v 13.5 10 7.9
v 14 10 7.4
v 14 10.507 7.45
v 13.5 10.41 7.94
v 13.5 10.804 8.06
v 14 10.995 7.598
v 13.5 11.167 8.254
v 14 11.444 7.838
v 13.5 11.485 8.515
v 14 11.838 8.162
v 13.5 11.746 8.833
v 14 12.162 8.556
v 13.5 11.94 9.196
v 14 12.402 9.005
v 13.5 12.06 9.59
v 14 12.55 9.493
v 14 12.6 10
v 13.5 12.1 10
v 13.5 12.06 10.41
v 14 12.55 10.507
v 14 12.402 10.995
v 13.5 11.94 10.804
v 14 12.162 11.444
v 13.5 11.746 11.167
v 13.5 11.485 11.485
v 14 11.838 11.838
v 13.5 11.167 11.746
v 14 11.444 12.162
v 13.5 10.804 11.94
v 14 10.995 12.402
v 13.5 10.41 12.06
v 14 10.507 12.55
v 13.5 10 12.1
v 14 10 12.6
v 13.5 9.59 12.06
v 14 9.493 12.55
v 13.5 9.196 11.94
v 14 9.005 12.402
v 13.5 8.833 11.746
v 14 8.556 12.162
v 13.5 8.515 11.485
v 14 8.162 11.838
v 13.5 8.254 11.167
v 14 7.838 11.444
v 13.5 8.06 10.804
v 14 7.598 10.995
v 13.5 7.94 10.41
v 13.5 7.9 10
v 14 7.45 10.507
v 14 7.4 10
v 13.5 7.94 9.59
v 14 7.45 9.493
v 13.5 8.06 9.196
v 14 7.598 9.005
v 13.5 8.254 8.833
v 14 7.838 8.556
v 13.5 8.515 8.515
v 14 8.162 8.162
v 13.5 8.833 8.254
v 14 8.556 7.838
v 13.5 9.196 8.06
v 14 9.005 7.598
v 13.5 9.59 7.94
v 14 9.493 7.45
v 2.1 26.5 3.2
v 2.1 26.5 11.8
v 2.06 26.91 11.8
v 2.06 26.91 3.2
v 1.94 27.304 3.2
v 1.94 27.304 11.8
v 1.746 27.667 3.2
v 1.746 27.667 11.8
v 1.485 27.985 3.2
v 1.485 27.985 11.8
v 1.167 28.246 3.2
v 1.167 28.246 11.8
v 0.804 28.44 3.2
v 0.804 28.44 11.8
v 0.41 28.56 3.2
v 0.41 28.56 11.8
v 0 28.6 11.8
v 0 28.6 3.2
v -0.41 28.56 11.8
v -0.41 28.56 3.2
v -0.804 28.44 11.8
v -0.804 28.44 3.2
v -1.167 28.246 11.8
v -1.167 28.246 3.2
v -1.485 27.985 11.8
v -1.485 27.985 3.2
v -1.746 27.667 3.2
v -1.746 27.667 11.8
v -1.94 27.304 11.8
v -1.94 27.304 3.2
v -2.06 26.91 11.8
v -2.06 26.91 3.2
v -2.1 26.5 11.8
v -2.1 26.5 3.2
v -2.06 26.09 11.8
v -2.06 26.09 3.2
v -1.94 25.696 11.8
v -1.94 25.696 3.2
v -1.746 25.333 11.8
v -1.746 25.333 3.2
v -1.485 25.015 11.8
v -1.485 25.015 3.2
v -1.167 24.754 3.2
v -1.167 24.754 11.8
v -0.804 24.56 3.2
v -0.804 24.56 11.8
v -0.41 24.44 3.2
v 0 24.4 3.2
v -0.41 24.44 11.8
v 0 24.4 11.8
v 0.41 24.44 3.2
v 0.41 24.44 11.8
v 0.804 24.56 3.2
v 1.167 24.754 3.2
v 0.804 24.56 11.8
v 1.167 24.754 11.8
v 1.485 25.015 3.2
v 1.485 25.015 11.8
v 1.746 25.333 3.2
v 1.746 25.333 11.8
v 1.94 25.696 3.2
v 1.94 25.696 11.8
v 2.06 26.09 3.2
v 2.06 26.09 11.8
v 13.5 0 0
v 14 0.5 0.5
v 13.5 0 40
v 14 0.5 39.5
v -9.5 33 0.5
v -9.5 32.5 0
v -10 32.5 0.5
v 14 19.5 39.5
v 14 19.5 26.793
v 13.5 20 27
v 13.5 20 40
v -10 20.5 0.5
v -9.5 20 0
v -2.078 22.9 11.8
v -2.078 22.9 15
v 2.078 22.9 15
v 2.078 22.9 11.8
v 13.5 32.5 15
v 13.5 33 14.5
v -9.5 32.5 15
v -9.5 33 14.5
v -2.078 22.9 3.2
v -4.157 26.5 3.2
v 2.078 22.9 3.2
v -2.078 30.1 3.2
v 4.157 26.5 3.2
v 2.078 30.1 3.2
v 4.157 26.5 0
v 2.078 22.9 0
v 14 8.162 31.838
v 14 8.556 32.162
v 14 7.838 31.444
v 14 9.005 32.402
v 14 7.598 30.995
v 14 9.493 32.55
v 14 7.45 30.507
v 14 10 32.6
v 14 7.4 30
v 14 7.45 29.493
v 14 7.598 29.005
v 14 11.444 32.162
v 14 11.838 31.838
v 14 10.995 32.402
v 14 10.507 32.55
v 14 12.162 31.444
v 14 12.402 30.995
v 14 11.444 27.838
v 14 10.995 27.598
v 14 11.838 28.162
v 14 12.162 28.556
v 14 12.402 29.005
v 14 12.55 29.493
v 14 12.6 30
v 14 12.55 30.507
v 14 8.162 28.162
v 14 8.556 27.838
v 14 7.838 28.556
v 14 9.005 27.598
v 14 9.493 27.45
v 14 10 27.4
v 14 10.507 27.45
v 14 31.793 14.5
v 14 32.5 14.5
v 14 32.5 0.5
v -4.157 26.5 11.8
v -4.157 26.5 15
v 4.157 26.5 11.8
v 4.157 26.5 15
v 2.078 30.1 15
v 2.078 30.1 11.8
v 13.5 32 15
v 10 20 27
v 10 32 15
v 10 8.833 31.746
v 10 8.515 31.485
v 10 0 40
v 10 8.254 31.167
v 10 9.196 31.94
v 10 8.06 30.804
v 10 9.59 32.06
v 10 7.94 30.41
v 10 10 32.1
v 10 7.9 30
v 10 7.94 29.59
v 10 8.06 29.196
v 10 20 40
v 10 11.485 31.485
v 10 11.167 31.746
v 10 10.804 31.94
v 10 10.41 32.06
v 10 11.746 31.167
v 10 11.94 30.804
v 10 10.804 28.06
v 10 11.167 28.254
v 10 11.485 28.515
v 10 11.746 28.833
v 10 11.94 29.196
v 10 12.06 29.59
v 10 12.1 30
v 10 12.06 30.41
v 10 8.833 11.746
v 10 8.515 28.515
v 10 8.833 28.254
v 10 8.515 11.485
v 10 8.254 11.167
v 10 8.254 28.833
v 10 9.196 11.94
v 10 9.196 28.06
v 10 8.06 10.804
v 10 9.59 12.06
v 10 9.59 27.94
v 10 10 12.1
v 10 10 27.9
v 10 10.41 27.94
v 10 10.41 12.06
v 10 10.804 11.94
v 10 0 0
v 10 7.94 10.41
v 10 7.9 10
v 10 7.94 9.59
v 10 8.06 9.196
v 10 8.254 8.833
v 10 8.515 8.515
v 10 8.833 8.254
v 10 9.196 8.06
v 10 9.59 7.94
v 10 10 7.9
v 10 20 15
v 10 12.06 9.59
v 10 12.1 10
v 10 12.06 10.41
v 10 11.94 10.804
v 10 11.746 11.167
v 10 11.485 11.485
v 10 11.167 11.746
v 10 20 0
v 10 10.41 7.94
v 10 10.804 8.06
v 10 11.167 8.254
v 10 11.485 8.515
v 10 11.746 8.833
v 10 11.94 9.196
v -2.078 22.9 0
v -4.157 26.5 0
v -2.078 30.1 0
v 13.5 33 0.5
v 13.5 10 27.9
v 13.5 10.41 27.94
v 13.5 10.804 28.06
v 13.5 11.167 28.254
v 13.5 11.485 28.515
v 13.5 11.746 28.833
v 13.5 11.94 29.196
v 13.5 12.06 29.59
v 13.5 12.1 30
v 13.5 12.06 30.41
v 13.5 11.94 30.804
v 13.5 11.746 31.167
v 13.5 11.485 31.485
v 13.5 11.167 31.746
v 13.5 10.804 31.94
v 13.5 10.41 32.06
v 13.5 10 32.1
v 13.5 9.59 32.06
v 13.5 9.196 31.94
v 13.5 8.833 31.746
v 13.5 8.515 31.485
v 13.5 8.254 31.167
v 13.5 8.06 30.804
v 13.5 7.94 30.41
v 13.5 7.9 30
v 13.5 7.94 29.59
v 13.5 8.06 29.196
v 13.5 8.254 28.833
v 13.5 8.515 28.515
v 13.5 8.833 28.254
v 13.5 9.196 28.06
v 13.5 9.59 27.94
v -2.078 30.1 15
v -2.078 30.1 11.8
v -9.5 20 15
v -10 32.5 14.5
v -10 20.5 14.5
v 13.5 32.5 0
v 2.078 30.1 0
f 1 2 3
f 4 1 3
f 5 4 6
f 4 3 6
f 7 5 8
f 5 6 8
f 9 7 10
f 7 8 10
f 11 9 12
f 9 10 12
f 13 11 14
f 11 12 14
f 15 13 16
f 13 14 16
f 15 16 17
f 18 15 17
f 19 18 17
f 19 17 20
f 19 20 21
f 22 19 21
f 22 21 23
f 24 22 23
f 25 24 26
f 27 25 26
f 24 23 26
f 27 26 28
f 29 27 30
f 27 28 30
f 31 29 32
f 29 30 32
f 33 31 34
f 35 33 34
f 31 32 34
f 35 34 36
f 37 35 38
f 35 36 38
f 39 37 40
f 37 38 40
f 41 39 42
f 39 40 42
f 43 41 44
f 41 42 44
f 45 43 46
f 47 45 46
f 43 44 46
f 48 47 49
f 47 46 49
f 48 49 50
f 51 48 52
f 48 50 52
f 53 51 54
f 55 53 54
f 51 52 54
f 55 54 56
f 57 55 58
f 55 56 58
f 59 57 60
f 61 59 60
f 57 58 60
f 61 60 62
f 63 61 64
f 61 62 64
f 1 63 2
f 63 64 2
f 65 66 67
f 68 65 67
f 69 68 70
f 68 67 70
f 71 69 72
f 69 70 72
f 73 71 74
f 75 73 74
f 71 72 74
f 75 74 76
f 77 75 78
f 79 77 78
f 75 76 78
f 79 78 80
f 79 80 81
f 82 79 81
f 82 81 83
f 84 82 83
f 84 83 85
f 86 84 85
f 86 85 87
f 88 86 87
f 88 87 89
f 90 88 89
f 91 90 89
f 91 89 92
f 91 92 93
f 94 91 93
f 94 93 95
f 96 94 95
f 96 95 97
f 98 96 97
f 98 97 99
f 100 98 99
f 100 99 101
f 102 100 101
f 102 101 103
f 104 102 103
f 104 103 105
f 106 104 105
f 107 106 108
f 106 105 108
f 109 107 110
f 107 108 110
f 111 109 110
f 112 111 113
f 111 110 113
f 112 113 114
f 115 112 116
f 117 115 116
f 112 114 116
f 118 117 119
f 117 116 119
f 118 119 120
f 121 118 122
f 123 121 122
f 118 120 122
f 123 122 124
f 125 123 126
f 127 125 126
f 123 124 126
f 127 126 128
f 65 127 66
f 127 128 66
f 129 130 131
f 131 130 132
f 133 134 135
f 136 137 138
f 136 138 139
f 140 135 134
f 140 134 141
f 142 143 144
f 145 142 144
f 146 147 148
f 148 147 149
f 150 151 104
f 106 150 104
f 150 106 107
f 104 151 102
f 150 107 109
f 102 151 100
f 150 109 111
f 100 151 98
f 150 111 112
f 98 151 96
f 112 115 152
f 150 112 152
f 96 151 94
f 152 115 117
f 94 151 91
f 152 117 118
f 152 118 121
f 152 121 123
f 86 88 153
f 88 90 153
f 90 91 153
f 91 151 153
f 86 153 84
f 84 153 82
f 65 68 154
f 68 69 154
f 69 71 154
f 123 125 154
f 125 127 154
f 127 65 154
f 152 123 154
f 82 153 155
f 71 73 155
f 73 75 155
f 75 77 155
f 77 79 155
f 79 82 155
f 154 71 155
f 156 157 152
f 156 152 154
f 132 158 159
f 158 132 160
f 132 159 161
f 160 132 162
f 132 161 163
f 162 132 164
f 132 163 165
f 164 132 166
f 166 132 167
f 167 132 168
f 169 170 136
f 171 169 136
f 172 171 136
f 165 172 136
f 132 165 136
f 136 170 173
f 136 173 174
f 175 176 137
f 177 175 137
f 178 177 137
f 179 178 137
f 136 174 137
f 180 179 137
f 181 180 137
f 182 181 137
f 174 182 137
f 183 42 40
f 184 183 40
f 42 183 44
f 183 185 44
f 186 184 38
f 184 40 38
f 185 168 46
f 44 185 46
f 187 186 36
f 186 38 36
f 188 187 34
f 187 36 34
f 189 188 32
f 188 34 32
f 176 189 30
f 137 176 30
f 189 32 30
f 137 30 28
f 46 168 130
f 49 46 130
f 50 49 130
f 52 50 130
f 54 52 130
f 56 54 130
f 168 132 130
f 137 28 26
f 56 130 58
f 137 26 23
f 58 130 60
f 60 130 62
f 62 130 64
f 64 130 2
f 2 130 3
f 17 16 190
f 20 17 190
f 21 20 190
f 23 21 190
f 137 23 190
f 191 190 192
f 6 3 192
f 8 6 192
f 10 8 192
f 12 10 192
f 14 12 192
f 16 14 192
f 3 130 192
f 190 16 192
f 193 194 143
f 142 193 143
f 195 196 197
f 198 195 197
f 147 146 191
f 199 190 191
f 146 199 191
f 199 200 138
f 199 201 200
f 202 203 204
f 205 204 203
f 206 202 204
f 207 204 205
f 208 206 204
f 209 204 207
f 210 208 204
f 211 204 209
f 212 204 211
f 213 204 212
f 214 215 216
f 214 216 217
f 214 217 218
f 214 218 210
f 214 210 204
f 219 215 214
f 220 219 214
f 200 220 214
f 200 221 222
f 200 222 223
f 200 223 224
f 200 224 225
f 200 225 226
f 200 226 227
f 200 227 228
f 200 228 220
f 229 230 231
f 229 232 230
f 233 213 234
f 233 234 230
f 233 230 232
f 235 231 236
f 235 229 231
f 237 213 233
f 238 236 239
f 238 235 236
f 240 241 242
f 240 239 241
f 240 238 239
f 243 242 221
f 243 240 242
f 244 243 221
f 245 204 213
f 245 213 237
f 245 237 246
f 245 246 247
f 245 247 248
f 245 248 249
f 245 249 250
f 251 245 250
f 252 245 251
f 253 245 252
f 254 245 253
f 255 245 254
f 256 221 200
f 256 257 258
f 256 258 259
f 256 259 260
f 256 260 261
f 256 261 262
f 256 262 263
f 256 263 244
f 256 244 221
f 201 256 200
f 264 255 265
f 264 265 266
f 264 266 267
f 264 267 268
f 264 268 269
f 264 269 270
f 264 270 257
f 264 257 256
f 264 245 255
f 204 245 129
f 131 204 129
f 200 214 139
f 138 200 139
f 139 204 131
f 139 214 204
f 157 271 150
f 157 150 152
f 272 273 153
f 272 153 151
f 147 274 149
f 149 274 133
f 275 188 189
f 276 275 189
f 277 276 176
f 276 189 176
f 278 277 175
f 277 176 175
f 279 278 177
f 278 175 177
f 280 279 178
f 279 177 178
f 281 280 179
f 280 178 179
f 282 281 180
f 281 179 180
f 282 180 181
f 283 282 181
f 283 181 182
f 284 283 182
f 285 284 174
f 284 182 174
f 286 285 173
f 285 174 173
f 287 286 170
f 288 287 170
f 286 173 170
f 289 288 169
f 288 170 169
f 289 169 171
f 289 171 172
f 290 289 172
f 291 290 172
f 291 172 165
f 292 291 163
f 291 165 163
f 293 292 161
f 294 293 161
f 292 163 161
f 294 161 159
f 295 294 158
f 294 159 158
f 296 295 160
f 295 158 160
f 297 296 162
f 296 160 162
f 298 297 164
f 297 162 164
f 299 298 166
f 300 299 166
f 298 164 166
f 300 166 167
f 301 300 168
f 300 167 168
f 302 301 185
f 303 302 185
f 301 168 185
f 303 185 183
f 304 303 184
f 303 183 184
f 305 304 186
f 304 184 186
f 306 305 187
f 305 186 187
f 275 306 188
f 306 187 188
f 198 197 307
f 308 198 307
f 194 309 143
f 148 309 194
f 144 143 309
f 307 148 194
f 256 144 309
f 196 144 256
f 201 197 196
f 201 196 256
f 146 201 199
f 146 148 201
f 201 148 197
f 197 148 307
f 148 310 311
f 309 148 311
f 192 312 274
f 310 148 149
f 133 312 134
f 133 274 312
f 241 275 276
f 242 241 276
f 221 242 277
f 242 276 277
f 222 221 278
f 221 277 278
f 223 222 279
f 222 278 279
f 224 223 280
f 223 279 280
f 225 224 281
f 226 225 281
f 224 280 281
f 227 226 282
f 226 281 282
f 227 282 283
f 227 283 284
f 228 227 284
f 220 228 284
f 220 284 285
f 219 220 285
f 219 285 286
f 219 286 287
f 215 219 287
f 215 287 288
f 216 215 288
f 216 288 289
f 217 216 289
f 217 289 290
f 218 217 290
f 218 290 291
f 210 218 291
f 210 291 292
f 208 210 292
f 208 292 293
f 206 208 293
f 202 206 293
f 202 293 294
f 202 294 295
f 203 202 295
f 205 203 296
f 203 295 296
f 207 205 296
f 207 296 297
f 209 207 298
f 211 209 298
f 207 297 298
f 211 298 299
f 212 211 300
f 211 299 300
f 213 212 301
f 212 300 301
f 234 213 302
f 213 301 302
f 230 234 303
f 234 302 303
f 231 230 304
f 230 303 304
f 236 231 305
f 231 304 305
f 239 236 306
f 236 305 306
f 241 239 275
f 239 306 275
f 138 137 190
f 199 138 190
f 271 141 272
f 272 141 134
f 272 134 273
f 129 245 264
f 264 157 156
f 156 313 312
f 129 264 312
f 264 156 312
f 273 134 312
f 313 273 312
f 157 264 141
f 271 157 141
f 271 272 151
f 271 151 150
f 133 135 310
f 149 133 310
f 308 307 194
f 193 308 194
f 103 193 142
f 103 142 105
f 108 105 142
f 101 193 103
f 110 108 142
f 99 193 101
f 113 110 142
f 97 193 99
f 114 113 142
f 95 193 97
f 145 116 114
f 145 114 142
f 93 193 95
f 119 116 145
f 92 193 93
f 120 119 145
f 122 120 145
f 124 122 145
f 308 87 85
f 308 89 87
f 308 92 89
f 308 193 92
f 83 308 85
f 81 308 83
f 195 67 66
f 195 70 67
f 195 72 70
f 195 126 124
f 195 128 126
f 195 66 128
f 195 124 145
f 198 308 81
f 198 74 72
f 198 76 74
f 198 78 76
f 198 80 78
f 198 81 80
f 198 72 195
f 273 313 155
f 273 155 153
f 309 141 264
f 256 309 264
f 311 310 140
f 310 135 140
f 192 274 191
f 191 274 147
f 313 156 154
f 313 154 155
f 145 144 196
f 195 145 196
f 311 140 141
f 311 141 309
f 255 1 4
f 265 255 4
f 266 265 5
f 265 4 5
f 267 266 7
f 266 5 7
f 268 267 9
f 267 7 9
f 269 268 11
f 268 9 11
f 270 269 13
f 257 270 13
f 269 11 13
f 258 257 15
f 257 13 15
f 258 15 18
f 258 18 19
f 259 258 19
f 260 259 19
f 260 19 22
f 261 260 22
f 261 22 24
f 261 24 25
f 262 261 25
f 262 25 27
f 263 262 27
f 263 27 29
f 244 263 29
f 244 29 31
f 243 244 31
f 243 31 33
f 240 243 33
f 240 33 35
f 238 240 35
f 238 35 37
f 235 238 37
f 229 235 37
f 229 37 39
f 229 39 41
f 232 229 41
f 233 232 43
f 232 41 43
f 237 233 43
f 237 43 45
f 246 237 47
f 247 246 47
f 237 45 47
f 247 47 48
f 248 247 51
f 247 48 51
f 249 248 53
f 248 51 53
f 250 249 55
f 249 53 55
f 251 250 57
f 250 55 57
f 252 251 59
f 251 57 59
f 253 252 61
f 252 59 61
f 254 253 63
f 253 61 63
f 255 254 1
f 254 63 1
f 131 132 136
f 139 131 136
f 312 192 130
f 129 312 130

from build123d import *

# Parameters (mm, degrees)
EXTRUDE_1_DEPTH     = 15
CUT_EXTRUDE_1_DEPTH = 3.2
SKETCH_3_R          = 2.1
CUT_EXTRUDE_2_DEPTH = 38.739104388
SKETCH_1_4_W        = 4
SKETCH_1_4_H        = 20
EXTRUDE_2_DEPTH     = 40
SKETCH_4_R          = 2.1
CUT_EXTRUDE_6_DEPTH = 40
CHAMFER_1_SIZE      = 12
CUT_EXTRUDE_START   = -15
CUT_EXTRUDE_7_DEPTH = 3.2
CHAMFER_3_SIZE      = 0.5


with BuildPart() as part:
    # 草图1 → 凸台-拉伸1 (new body)
    with BuildSketch(Plane.XY):
        Polygon((-10, 33), (-10, 20), (10, 20), (14, 20), (14, 33), align=None)
    extrude(amount=EXTRUDE_1_DEPTH)

    # 草图2 → 切除-拉伸1 (cut)
    with BuildSketch(Plane.XY.offset(15)):
        Polygon((2.078460969, 22.9), (4.156921938, 26.5), (2.078460969, 30.1), (-2.078460969, 30.1), (-4.156921938, 26.5), (-2.078460969, 22.9), align=None)
    extrude(amount=-CUT_EXTRUDE_1_DEPTH, mode=Mode.SUBTRACT)

    # 草图3 → 切除-拉伸2 (cut, through all)
    with BuildSketch(Plane.XY.offset(11.8)):
        with Locations((0, 26.5)):
            Circle(SKETCH_3_R)
    extrude(amount=-CUT_EXTRUDE_2_DEPTH, mode=Mode.SUBTRACT)

    # 草图1<4> → 凸台-拉伸2 (add)
    with BuildSketch(Plane.XY):
        with Locations((12, 10)):
            Rectangle(SKETCH_1_4_W, SKETCH_1_4_H)
    extrude(amount=EXTRUDE_2_DEPTH)

    # 草图4 → 切除-拉伸6 (cut)
    with BuildSketch(Plane(origin=(14, 0, 0), x_dir=(0, 0, -1), z_dir=(1, 0, 0))):
        with Locations((-30, 10)):
            Circle(SKETCH_4_R)
        with Locations((-10, 10)):
            Circle(SKETCH_4_R)
    extrude(amount=-CUT_EXTRUDE_6_DEPTH, mode=Mode.SUBTRACT)

    # 倒角1
    chamfer_1_edges = [part.edges().sort_by_distance(p)[0] for p in [
        (12, 20, 15),
    ]]
    chamfer(chamfer_1_edges, length=CHAMFER_1_SIZE)

    # 草图2<3> → 切除-拉伸7 (cut)
    with BuildSketch(Plane.XY.offset(15).offset(CUT_EXTRUDE_START)):
        Polygon((4.156921938, 26.5), (2.078460969, 30.1), (-2.078460969, 30.1), (-4.156921938, 26.5), (-2.078460969, 22.9), (2.078460969, 22.9), align=None)
    extrude(amount=CUT_EXTRUDE_7_DEPTH, mode=Mode.SUBTRACT)

    # 倒角3
    chamfer_3_edges = [part.edges().sort_by_distance(p)[0] for p in [
        (-10, 26.5, 15),
        (-10, 20, 7.5),
        (-10, 26.5, 0),
        (2, 33, 15),
        (-10, 33, 7.5),
        (2, 33, 0),
        (14, 0, 20),
        (14, 10, 40),
        (14, 20, 33.5),
        (14, 26, 21),
        (14, 32.5, 15),
        (14, 33, 7.5),
        (14, 16.5, 0),
        (14, 10, 12.1),
        (14, 10, 32.1),
    ]]
    chamfer(chamfer_3_edges, length=CHAMFER_3_SIZE)


solid = part.part
